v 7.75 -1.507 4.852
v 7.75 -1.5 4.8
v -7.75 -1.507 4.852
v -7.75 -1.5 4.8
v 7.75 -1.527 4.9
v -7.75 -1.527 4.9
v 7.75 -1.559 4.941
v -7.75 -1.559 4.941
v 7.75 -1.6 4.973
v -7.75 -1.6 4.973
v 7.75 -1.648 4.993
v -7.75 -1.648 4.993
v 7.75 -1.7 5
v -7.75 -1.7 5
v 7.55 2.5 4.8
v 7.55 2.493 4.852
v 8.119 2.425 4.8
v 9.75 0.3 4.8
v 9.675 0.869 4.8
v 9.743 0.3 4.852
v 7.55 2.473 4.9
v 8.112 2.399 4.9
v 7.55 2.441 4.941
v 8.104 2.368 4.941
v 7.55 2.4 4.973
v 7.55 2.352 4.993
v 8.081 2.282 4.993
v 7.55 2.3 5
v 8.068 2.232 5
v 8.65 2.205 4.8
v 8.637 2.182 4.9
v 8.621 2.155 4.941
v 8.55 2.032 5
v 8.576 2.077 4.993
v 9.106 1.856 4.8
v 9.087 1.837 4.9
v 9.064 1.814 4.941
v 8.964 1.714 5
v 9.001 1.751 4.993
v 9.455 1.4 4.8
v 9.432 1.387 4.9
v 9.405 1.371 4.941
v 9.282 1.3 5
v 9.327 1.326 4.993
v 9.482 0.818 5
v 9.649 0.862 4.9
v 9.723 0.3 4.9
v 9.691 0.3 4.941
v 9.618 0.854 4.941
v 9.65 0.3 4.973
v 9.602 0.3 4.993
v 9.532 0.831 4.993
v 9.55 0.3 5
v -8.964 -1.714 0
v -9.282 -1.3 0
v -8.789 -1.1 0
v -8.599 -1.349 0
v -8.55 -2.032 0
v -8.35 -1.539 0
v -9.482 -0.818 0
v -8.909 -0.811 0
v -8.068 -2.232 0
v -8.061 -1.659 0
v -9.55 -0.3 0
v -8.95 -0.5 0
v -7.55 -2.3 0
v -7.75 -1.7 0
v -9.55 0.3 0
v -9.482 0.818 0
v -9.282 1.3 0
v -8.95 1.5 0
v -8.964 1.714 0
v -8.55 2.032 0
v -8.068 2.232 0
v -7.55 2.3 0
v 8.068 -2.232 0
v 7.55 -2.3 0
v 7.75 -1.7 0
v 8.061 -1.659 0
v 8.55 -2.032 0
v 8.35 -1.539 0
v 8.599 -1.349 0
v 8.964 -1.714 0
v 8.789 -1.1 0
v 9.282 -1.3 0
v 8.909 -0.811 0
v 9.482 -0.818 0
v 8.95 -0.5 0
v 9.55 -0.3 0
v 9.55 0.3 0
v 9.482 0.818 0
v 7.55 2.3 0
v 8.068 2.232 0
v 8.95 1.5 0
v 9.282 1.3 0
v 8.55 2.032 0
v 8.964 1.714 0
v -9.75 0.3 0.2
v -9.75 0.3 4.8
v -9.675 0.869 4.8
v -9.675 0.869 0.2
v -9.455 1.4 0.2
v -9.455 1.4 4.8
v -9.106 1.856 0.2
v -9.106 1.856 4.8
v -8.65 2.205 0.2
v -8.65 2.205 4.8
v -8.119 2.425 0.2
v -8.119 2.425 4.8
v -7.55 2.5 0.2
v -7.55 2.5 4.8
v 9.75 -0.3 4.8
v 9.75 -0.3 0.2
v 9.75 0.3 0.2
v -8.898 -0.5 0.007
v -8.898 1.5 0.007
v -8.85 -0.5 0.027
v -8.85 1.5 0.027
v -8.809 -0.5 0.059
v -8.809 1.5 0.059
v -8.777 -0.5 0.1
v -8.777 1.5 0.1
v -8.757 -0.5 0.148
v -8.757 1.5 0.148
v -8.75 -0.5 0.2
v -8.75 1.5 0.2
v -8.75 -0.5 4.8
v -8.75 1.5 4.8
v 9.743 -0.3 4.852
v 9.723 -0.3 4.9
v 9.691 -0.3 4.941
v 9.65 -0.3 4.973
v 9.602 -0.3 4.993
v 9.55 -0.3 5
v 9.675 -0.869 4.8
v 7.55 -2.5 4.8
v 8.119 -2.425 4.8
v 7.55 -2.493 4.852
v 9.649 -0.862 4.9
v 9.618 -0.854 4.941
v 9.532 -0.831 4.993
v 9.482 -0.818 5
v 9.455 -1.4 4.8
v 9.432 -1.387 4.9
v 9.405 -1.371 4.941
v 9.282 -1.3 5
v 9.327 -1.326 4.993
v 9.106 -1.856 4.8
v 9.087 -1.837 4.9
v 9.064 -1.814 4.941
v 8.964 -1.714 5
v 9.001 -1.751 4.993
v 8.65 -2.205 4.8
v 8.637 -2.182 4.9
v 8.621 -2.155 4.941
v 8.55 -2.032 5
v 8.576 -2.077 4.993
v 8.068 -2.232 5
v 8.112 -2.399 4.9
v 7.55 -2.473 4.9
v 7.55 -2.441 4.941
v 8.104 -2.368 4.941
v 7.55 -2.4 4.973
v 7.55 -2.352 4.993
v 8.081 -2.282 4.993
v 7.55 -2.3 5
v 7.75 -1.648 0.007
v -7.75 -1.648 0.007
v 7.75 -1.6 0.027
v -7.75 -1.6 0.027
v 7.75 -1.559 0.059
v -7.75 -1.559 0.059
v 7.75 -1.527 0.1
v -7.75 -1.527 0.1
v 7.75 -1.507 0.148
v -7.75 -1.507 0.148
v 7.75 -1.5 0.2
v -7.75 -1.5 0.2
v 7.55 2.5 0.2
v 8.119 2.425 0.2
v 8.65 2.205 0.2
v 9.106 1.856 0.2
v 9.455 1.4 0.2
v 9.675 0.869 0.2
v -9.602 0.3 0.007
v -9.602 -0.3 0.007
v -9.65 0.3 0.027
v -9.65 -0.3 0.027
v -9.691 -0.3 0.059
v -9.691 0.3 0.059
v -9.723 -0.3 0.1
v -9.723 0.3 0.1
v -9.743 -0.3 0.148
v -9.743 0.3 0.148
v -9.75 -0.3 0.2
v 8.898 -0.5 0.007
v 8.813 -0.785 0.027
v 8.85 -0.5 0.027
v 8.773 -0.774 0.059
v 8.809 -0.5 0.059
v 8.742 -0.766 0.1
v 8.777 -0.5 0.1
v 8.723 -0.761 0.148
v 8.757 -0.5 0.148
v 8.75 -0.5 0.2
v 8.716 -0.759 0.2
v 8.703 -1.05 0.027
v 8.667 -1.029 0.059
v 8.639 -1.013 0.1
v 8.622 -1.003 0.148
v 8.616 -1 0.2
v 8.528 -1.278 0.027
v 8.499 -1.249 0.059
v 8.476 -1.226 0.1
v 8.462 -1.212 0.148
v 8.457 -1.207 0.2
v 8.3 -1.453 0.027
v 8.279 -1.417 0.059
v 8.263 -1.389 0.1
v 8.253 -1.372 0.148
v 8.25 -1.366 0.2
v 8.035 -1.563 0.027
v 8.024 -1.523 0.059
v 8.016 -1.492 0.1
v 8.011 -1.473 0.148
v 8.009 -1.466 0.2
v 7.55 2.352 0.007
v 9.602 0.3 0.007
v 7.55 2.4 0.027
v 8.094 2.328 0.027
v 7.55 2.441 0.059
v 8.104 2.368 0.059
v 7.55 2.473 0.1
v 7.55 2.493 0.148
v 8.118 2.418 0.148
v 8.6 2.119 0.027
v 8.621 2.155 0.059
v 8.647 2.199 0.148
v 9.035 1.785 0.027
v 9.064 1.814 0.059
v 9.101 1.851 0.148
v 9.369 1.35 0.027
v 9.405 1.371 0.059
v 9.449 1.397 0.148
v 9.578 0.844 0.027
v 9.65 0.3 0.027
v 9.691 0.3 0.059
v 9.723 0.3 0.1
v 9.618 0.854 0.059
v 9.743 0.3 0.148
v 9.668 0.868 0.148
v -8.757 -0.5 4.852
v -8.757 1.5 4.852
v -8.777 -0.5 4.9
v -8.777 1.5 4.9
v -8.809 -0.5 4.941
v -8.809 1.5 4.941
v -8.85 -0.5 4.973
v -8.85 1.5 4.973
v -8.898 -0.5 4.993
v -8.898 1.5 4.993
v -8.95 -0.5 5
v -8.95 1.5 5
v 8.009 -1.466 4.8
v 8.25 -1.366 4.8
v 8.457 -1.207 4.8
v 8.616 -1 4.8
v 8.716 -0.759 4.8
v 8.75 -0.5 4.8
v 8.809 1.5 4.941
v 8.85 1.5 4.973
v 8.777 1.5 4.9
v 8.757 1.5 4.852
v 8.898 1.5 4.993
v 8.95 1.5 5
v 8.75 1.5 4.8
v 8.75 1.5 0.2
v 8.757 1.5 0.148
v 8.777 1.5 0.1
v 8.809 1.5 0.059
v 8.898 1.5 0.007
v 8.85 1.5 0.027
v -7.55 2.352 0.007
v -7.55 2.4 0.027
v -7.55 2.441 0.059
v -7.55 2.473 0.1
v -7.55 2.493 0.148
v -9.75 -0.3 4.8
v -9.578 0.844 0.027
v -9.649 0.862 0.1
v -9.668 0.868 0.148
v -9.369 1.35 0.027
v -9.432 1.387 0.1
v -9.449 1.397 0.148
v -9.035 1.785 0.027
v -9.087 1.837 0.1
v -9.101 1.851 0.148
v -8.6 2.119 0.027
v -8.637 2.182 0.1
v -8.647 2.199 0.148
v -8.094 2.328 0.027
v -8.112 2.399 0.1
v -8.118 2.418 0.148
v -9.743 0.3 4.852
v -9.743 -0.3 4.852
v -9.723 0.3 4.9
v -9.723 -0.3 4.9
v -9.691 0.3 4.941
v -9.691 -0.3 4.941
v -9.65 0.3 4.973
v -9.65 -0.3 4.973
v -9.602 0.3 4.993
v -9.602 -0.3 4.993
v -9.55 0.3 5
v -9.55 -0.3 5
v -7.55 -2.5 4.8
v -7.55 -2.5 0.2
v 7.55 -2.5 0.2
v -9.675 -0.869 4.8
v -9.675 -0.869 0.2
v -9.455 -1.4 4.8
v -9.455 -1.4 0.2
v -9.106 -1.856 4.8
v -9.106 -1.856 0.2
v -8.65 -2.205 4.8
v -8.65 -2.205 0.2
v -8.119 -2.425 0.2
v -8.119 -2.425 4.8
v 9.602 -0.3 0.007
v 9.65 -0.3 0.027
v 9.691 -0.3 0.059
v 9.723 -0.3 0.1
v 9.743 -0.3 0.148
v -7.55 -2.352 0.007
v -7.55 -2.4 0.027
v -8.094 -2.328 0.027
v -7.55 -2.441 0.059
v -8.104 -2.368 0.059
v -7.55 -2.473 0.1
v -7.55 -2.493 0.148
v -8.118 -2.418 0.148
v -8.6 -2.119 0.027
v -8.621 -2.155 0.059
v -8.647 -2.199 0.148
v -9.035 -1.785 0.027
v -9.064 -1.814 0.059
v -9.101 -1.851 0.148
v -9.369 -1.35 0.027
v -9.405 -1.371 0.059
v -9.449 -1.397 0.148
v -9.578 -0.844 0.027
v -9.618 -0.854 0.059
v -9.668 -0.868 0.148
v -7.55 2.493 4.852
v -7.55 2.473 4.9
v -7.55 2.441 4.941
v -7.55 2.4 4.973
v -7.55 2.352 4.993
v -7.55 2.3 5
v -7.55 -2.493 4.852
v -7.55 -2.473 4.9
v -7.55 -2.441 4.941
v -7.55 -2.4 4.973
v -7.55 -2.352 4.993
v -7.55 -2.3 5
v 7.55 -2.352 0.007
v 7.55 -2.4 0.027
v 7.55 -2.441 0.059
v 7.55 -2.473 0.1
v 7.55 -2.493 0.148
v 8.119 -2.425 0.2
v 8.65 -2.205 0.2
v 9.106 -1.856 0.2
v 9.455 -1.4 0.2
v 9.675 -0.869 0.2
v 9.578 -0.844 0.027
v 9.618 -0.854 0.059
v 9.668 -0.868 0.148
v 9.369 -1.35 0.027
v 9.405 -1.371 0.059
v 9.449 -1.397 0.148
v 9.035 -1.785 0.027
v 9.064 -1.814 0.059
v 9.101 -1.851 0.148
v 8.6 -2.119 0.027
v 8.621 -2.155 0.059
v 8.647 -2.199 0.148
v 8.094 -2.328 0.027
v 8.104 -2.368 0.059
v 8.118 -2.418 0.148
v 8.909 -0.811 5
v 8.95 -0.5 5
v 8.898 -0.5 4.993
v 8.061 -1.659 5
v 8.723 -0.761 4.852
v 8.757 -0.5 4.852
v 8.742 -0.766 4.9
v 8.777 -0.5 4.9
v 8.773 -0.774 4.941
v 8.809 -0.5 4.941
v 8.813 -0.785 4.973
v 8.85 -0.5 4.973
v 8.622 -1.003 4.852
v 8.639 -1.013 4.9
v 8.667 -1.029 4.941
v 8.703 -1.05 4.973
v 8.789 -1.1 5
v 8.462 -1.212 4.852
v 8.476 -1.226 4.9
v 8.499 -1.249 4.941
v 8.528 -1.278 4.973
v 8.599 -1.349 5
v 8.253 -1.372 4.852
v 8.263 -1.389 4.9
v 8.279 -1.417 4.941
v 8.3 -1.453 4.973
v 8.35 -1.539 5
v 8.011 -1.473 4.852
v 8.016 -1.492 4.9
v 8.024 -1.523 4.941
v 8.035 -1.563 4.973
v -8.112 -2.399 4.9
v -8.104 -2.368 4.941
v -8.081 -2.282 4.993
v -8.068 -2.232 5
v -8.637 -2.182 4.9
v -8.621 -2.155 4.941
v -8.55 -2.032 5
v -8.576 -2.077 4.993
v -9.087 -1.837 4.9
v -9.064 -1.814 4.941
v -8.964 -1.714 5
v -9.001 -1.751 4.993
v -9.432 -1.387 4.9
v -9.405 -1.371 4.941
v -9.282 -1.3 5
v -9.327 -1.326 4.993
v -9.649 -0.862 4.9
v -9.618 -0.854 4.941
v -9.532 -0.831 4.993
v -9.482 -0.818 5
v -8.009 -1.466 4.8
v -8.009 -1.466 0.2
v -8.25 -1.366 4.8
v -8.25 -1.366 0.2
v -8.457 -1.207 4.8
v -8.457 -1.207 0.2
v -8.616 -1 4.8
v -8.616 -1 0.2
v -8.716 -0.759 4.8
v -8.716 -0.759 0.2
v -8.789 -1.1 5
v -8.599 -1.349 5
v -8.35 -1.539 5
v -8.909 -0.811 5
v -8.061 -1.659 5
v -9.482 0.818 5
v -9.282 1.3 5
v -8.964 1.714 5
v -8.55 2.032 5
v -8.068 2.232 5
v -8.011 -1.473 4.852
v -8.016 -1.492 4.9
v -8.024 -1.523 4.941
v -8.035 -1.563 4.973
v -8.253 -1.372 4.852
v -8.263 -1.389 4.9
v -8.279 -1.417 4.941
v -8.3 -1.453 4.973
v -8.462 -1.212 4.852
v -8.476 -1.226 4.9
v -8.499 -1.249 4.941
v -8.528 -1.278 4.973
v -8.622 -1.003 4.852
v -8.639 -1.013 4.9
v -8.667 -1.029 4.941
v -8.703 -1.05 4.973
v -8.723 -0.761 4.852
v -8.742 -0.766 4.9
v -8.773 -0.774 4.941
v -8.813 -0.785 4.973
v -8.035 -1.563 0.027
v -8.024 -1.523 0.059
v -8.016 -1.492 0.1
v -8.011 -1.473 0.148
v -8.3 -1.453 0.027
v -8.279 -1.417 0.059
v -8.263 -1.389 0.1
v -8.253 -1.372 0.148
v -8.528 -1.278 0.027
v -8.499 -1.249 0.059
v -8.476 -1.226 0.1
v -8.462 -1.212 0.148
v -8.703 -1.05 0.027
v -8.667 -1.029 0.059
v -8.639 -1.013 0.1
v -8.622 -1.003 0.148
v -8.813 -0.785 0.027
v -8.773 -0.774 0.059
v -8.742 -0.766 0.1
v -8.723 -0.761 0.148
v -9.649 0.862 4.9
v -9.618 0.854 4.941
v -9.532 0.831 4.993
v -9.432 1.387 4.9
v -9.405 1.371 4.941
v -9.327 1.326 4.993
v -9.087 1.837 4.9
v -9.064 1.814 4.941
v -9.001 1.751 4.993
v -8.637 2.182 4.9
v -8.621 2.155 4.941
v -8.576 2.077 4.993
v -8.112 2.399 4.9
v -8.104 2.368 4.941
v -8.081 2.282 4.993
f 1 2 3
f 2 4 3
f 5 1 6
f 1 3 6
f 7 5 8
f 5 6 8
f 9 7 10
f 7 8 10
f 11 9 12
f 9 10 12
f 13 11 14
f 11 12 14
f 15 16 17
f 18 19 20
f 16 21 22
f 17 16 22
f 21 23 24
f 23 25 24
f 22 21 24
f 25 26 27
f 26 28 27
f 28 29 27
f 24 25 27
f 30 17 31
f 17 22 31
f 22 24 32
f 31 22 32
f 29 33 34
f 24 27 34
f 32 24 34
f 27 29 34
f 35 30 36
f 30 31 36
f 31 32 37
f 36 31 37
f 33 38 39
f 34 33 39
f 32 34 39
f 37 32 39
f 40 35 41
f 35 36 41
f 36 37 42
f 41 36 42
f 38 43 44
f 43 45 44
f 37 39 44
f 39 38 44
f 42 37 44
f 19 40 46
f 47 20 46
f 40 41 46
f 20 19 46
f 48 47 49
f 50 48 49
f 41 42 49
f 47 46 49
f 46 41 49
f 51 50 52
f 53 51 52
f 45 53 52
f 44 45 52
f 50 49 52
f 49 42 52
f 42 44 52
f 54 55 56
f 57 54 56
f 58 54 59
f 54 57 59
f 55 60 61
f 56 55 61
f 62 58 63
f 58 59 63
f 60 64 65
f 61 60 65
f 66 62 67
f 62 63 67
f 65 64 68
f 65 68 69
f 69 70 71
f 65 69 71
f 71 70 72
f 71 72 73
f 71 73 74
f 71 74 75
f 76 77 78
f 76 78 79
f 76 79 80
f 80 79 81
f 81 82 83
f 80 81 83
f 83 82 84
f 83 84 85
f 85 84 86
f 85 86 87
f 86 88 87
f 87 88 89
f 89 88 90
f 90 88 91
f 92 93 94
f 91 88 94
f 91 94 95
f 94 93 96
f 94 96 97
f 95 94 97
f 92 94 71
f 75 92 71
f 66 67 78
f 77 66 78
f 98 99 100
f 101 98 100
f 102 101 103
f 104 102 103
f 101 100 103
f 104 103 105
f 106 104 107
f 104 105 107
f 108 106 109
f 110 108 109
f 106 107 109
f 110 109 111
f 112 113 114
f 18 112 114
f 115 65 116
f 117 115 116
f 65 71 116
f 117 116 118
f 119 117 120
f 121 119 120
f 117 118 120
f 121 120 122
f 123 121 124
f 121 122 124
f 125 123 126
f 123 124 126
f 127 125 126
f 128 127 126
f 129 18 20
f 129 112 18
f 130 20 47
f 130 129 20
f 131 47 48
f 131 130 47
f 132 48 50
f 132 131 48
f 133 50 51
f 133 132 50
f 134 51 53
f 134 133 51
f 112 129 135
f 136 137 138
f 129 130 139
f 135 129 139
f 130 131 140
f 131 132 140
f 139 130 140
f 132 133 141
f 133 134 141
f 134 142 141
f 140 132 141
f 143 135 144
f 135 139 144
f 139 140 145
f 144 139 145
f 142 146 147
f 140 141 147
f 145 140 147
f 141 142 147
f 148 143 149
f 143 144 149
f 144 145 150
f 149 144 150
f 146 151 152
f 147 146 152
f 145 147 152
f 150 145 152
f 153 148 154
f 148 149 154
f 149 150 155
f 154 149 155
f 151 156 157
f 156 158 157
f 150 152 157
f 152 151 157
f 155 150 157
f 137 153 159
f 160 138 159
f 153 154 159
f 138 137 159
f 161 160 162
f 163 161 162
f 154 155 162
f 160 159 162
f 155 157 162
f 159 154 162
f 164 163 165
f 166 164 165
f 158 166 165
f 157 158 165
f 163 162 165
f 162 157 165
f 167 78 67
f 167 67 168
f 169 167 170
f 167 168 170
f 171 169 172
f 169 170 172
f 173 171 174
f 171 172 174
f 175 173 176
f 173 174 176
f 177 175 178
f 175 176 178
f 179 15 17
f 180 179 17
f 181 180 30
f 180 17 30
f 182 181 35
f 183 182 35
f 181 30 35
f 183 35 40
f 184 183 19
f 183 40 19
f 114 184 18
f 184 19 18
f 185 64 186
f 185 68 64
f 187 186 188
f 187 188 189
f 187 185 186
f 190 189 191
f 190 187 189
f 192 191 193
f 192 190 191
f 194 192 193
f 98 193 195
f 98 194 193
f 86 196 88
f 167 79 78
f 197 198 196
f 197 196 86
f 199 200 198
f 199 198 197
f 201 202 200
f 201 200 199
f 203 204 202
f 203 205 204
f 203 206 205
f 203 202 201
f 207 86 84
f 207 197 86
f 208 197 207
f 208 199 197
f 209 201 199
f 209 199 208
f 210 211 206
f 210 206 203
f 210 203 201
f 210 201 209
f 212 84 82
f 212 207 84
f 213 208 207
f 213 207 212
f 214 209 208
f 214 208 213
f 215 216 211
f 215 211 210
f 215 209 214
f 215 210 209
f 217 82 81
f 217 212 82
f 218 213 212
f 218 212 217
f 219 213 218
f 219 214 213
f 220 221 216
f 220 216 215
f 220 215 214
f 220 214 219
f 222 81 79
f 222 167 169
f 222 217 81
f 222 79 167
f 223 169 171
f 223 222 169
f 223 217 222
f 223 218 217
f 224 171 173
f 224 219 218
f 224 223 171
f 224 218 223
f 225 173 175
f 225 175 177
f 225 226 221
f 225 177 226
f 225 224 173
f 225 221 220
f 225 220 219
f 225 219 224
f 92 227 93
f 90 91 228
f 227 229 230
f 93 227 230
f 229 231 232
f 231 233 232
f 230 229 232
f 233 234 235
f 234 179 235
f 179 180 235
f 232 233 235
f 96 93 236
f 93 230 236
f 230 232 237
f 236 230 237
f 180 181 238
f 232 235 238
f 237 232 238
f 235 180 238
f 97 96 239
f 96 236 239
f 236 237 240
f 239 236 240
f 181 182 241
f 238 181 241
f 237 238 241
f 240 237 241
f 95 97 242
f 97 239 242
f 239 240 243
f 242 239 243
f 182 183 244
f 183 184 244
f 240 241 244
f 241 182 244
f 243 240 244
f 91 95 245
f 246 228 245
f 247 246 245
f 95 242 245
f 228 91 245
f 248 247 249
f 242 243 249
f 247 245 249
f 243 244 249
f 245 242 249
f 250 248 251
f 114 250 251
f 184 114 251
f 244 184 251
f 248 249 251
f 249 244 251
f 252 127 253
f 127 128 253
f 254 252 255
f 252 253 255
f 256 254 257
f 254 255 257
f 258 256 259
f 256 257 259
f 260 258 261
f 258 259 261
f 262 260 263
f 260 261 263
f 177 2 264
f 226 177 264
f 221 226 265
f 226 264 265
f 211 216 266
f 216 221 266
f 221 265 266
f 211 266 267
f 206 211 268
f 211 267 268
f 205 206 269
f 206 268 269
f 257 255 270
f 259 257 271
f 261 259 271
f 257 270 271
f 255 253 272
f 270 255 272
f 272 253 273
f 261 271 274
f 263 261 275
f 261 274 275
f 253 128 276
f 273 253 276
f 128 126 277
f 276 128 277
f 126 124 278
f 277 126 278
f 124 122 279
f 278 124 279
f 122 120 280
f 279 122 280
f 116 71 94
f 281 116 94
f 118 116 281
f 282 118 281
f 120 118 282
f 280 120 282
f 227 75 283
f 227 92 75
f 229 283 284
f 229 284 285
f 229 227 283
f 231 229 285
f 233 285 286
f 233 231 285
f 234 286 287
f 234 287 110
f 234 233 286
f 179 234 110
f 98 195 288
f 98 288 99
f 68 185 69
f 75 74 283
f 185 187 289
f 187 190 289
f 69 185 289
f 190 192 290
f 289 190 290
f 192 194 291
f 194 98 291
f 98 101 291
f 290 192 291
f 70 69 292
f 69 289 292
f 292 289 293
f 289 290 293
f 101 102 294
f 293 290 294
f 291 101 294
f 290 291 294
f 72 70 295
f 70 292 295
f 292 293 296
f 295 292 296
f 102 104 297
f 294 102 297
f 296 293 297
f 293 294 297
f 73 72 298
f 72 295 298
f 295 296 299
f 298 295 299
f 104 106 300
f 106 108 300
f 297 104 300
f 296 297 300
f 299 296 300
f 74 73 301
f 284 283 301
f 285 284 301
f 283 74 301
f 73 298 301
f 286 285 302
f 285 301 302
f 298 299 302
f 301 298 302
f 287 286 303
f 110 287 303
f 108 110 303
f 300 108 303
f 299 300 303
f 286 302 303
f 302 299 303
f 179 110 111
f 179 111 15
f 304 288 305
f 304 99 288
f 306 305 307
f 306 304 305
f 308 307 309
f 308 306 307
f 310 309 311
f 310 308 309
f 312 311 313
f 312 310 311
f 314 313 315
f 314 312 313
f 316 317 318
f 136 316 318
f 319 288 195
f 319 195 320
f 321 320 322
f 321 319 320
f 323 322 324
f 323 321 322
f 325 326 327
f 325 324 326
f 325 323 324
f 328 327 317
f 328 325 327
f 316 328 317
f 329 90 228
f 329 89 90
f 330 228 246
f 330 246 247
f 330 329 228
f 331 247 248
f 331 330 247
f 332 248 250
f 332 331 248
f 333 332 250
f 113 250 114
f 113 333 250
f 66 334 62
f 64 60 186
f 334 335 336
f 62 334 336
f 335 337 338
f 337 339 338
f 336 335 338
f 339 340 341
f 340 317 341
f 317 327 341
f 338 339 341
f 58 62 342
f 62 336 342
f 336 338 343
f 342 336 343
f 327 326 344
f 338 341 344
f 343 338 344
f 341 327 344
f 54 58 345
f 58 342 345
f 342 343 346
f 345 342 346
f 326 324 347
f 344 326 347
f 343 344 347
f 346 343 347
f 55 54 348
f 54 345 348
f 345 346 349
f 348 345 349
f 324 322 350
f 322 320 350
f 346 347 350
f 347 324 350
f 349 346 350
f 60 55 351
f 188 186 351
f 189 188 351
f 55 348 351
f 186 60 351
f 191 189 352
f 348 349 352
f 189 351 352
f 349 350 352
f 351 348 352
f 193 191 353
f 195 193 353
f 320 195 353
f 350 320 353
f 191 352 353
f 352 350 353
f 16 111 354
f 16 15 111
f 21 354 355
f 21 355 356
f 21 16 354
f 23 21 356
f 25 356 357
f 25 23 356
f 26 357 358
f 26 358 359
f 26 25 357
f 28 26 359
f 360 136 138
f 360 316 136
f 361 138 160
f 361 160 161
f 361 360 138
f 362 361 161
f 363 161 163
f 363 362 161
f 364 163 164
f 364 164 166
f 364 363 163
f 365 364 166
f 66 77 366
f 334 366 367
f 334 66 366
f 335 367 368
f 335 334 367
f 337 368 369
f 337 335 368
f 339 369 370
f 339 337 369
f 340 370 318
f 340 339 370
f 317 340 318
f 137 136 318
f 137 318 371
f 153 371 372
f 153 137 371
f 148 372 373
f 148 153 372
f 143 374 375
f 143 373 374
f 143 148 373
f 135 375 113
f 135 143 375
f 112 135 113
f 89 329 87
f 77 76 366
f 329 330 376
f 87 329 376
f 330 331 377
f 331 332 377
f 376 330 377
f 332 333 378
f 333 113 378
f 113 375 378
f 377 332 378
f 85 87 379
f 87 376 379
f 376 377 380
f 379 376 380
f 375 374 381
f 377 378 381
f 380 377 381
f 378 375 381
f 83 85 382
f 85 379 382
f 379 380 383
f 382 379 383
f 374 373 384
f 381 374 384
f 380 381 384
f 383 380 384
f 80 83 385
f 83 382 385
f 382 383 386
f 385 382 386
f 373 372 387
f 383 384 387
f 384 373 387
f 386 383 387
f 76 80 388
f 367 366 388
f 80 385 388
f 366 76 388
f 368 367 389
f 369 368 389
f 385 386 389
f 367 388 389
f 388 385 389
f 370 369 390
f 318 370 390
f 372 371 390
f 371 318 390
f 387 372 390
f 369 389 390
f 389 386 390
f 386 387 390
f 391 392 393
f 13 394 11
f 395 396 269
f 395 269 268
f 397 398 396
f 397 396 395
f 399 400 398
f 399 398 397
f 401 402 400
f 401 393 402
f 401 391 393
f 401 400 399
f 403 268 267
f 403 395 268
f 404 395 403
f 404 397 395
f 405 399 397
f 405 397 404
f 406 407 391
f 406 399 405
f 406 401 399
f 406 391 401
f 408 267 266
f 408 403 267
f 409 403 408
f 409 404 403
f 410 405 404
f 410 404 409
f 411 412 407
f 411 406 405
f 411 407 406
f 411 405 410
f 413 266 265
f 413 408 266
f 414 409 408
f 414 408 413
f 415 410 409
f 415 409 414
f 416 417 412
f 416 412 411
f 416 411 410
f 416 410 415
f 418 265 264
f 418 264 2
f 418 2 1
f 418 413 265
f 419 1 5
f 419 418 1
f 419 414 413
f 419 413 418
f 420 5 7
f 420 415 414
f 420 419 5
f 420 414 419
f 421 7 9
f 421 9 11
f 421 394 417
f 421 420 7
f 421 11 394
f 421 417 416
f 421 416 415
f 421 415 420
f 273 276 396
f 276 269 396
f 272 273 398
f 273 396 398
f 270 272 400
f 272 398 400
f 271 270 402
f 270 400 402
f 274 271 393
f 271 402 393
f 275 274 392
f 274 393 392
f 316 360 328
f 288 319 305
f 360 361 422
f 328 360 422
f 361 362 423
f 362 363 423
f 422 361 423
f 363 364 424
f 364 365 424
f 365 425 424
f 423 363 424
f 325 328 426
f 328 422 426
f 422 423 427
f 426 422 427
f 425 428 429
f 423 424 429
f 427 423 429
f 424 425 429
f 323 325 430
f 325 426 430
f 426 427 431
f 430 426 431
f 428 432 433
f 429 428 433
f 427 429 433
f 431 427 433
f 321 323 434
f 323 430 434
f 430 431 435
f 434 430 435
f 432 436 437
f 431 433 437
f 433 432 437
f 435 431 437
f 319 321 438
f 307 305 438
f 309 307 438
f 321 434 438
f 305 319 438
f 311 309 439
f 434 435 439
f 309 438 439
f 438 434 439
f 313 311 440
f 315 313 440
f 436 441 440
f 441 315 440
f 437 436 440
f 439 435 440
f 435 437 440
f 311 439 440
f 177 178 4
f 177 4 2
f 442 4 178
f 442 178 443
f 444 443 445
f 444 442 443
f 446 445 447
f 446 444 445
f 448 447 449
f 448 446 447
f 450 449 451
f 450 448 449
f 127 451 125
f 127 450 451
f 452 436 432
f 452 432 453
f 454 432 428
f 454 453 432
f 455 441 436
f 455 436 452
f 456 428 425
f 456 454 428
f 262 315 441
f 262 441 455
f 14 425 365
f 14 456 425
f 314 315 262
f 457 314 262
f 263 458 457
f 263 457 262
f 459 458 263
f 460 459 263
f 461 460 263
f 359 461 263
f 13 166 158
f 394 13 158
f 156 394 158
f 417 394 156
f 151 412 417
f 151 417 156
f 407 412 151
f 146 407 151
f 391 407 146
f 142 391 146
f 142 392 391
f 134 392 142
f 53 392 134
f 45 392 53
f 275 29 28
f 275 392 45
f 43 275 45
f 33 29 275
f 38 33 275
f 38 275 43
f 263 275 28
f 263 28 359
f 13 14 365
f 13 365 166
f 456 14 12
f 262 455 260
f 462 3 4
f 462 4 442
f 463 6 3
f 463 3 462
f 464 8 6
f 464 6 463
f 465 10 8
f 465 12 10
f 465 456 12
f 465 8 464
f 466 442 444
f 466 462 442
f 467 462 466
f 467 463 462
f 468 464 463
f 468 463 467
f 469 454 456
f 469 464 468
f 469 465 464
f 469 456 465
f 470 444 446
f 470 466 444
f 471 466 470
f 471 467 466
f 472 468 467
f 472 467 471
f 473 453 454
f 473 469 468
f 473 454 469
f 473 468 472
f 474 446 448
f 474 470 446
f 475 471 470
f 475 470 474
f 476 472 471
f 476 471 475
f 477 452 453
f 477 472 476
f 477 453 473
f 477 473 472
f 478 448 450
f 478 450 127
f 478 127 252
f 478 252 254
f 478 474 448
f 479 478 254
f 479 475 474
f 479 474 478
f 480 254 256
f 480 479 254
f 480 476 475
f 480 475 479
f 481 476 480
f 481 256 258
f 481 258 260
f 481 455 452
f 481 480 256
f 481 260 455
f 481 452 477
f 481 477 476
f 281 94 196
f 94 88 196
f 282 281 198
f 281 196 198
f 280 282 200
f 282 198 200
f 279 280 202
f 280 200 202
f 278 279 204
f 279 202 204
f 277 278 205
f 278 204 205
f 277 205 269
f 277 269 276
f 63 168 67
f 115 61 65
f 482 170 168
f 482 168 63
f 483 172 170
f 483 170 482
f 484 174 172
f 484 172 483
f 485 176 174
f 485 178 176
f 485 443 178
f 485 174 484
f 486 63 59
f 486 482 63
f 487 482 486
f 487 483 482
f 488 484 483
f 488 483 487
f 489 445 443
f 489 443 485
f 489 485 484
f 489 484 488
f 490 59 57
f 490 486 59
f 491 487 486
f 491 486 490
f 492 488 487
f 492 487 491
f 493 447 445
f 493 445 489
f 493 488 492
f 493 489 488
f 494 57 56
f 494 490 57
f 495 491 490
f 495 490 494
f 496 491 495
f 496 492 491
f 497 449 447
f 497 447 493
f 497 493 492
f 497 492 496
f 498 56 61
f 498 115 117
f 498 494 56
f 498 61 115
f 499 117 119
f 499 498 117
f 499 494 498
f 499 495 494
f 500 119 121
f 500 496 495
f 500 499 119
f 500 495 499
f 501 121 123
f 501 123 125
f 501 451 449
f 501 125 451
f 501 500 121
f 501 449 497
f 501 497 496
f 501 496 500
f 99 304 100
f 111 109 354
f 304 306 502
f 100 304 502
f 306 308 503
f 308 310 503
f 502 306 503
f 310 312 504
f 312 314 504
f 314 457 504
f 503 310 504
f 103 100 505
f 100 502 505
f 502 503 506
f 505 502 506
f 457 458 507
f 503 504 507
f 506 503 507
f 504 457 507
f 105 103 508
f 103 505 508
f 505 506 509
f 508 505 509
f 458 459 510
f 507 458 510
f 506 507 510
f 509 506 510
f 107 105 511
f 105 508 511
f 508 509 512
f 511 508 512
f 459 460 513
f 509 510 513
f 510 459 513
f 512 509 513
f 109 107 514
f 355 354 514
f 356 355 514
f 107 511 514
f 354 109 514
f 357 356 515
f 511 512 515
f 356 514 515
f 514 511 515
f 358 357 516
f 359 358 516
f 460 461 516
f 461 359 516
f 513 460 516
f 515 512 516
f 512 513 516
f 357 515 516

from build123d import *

# Parameters (mm, degrees)
SKETCH_1_W      = 19.5
SKETCH_1_H      = 5
SKETCH_1_W_2    = 17.5
SKETCH_1_H_2    = 3
EXTRUDE_1_DEPTH = 5
FILLET_1_R      = 2.2
FILLET_2_R      = 1
FILLET_3_R      = 0.2


with BuildPart() as part:
    # Эскиз1 → Бобышка-Вытянуть1 (new body)
    with BuildSketch(Plane.XY):
        Rectangle(SKETCH_1_W, SKETCH_1_H)
        Rectangle(SKETCH_1_W_2, SKETCH_1_H_2, mode=Mode.SUBTRACT)
    extrude(amount=EXTRUDE_1_DEPTH)

    # Скругление1
    fillet_1_edges = [part.edges().sort_by_distance(p)[0] for p in [
        (-9.75, 2.5, 2.5),
        (9.75, 2.5, 2.5),
        (9.75, -2.5, 2.5),
        (-9.75, -2.5, 2.5),
    ]]
    fillet(fillet_1_edges, radius=FILLET_1_R)

    # Скругление2
    fillet_2_edges = [part.edges().sort_by_distance(p)[0] for p in [
        (8.75, -1.5, 2.5),
        (-8.75, -1.5, 2.5),
    ]]
    fillet(fillet_2_edges, radius=FILLET_2_R)

    # Скругление3
    fillet_3_edges = [part.edges().sort_by_distance(p)[0] for p in [
        (-8.75, 0.5, 0),
        (-8.75, 0.5, 5),
        (0, 2.5, 0),
        (0, 2.5, 5),
        (-9.75, 0, 0),
        (9.75, 0, 0),
        (0, -2.5, 0),
        (9.105634919, -1.855634919, 0),
        (-9.105634919, -1.855634919, 0),
        (-9.105634919, 1.855634919, 0),
        (9.105634919, 1.855634919, 0),
        (9.75, 0, 5),
        (-9.75, 0, 5),
        (0, -2.5, 5),
        (9.105634919, -1.855634919, 5),
        (-9.105634919, -1.855634919, 5),
        (-9.105634919, 1.855634919, 5),
        (9.105634919, 1.855634919, 5),
        (0, -1.5, 0),
        (0, -1.5, 5),
        (8.75, 0.5, 0),
        (8.75, 0.5, 5),
        (-8.457106781, -1.207106781, 0),
        (-8.457106781, -1.207106781, 5),
        (8.457106781, -1.207106781, 0),
        (8.457106781, -1.207106781, 5),
    ]]
    fillet(fillet_3_edges, radius=FILLET_3_R)


solid = part.part
